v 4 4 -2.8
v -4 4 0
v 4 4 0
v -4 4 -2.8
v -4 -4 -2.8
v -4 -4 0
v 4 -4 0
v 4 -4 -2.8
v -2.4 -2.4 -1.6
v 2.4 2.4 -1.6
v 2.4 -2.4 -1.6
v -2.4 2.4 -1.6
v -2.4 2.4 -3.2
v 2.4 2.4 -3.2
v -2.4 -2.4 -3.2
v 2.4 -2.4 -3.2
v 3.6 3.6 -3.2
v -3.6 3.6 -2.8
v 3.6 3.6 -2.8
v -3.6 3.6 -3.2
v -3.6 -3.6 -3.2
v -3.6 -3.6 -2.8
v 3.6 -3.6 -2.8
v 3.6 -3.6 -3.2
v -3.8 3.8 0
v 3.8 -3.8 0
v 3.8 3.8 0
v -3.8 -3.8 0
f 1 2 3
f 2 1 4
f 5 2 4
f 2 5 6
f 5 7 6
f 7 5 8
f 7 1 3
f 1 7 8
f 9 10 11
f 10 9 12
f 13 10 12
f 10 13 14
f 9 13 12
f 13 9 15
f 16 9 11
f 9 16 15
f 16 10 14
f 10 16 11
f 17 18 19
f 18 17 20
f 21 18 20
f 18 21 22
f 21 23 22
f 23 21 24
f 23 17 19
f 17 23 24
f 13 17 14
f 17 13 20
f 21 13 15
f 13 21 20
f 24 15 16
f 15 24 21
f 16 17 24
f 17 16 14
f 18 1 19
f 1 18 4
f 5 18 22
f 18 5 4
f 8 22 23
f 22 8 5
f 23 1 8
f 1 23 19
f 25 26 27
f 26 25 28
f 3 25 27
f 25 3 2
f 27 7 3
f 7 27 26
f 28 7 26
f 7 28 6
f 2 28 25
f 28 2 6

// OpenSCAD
// file: ../p/box5.scad
use <../lib.scad>
function ldraw_lib__box5() = [
// 0 Box with 5 Faces and All Edges
// 0 Name: box5.dat
// 0 Author: James Jessiman
// 0 !LDRAW_ORG Primitive UPDATE 2012-01
// 0 !LICENSE Licensed under CC BY 4.0 : see CAreadme.txt
// 
// 0 BFC CERTIFY CCW
  [0,"BFC","CERTIFY"],
  [0,"BFC","CCW"],
// 
// 0 !HISTORY 2002-04-03 [sbliss] Modified for BFC compliance
// 0 !HISTORY 2002-04-25 [PTadmin] Official Update 2002-02
// 0 !HISTORY 2007-06-24 [PTadmin] Header formatted for Contributor Agreement
// 0 !HISTORY 2008-07-01 [PTadmin] Official Update 2008-01
// 0 !HISTORY 2012-02-16 [Philo] Changed to CCW
// 0 !HISTORY 2012-03-30 [PTadmin] Official Update 2012-01
// 
// 
// 2 24 1 1 1 -1 1 1
  [2,24,1,1,1,-1,1,1],
// 2 24 -1 1 1 -1 1 -1
  [2,24,-1,1,1,-1,1,-1],
// 2 24 -1 1 -1 1 1 -1
  [2,24,-1,1,-1,1,1,-1],
// 2 24 1 1 -1 1 1 1
  [2,24,1,1,-1,1,1,1],
// 2 24 1 0 1 -1 0 1
  [2,24,1,0,1,-1,0,1],
// 2 24 -1 0 1 -1 0 -1
  [2,24,-1,0,1,-1,0,-1],
// 2 24 -1 0 -1 1 0 -1
  [2,24,-1,0,-1,1,0,-1],
// 2 24 1 0 -1 1 0 1
  [2,24,1,0,-1,1,0,1],
// 2 24 1 0 1 1 1 1
  [2,24,1,0,1,1,1,1],
// 2 24 -1 0 1 -1 1 1
  [2,24,-1,0,1,-1,1,1],
// 2 24 1 0 -1 1 1 -1
  [2,24,1,0,-1,1,1,-1],
// 2 24 -1 0 -1 -1 1 -1
  [2,24,-1,0,-1,-1,1,-1],
// 4 16 -1 1 1 1 1 1 1 1 -1 -1 1 -1
  [4,16,-1,1,1,1,1,1,1,1,-1,-1,1,-1],
// 4 16 -1 1 1 -1 0 1 1 0 1 1 1 1
  [4,16,-1,1,1,-1,0,1,1,0,1,1,1,1],
// 4 16 -1 1 -1 -1 0 -1 -1 0 1 -1 1 1
  [4,16,-1,1,-1,-1,0,-1,-1,0,1,-1,1,1],
// 4 16 1 1 -1 1 0 -1 -1 0 -1 -1 1 -1
  [4,16,1,1,-1,1,0,-1,-1,0,-1,-1,1,-1],
// 4 16 1 1 1 1 0 1 1 0 -1 1 1 -1
  [4,16,1,1,1,1,0,1,1,0,-1,1,1,-1],
];
module ldraw_lib__box5(step=0, col=false, unit=2/5, alt=false, line=0.2, solid=!$preview)
    makepoly(ldraw_lib__box5(), step=step, col=col, unit=unit, alt=alt, line=line, solid=solid);
ldraw_lib__box5(line=0.2);
// file: ../p/box4.scad
use <../lib.scad>
function ldraw_lib__box4() = [
// 0 Box with 4 Faces (2 Parallel Pairs) and All Edges
// 0 Name: box4.dat
// 0 Author: James Jessiman
// 0 !LDRAW_ORG Primitive UPDATE 2012-01
// 0 !LICENSE Licensed under CC BY 4.0 : see CAreadme.txt
// 
// 0 BFC CERTIFY CCW
  [0,"BFC","CERTIFY"],
  [0,"BFC","CCW"],
// 
// 0 !HISTORY 2002-04-03 [sbliss] Modified for BFC compliance
// 0 !HISTORY 2002-04-25 [PTadmin] Official Update 2002-02
// 0 !HISTORY 2007-06-24 [PTadmin] Header formatted for Contributor Agreement
// 0 !HISTORY 2008-07-01 [PTadmin] Official Update 2008-01
// 0 !HISTORY 2012-02-16 [Philo] Changed to CCW
// 0 !HISTORY 2012-03-30 [PTadmin] Official Update 2012-01
// 
// 
// 2 24 1 1 1 -1 1 1
  [2,24,1,1,1,-1,1,1],
// 2 24 -1 1 1 -1 1 -1
  [2,24,-1,1,1,-1,1,-1],
// 2 24 -1 1 -1 1 1 -1
  [2,24,-1,1,-1,1,1,-1],
// 2 24 1 1 -1 1 1 1
  [2,24,1,1,-1,1,1,1],
// 2 24 1 0 1 -1 0 1
  [2,24,1,0,1,-1,0,1],
// 2 24 -1 0 1 -1 0 -1
  [2,24,-1,0,1,-1,0,-1],
// 2 24 -1 0 -1 1 0 -1
  [2,24,-1,0,-1,1,0,-1],
// 2 24 1 0 -1 1 0 1
  [2,24,1,0,-1,1,0,1],
// 2 24 1 0 1 1 1 1
  [2,24,1,0,1,1,1,1],
// 2 24 -1 0 1 -1 1 1
  [2,24,-1,0,1,-1,1,1],
// 2 24 1 0 -1 1 1 -1
  [2,24,1,0,-1,1,1,-1],
// 2 24 -1 0 -1 -1 1 -1
  [2,24,-1,0,-1,-1,1,-1],
// 4 16 -1 1 1 -1 0 1 1 0 1 1 1 1
  [4,16,-1,1,1,-1,0,1,1,0,1,1,1,1],
// 4 16 -1 1 -1 -1 0 -1 -1 0 1 -1 1 1
  [4,16,-1,1,-1,-1,0,-1,-1,0,1,-1,1,1],
// 4 16 1 1 -1 1 0 -1 -1 0 -1 -1 1 -1
  [4,16,1,1,-1,1,0,-1,-1,0,-1,-1,1,-1],
// 4 16 1 1 1 1 0 1 1 0 -1 1 1 -1
  [4,16,1,1,1,1,0,1,1,0,-1,1,1,-1],
];
module ldraw_lib__box4(step=0, col=false, unit=2/5, alt=false, line=0.2, solid=!$preview)
    makepoly(ldraw_lib__box4(), step=step, col=col, unit=unit, alt=alt, line=line, solid=solid);
ldraw_lib__box4(line=0.2);
// file: s/3070bs01.scad
use <../../lib.scad>
use <../../p/box4.scad>
use <../../p/box5.scad>
function ldraw_lib__s__3070bs01() = [
// 0 ~Tile  1 x  1 with Groove without Top Face
// 0 Name: s\3070bs01.dat
// 0 Author: Chris Dee [cwdee]
// 0 !LDRAW_ORG Subpart UPDATE 2009-02
// 0 !LICENSE Licensed under CC BY 4.0 : see CAreadme.txt
// 
// 0 BFC CERTIFY CCW
  [0,"BFC","CERTIFY"],
  [0,"BFC","CCW"],
// 
// 0 !HISTORY 2009-09-03 [PTadmin] Official Update 2009-02
// 
// 
// 1 16 0 0 0 10 0 0 0 7 0 0 0 10 box4.dat
  [1,16,0,0,0,10,0,0,0,7,0,0,0,10, ldraw_lib__box4()],
// 0 BFC INVERTNEXT
  [0,"BFC","INVERTNEXT"],
// 1 16 0 8 0 6 0 0 0 -4 0 0 0 6 box5.dat
  [1,16,0,8,0,6,0,0,0,-4,0,0,0,6, ldraw_lib__box5()],
// 1 16 0 7 0 9 0 0 0 1 0 0 0 9 box4.dat
  [1,16,0,7,0,9,0,0,0,1,0,0,0,9, ldraw_lib__box4()],
// 
// 4 16 9 8 9 6 8 6 -6 8 6 -9 8 9
  [4,16,9,8,9,6,8,6,-6,8,6,-9,8,9],
// 4 16 -9 8 9 -6 8 6 -6 8 -6 -9 8 -9
  [4,16,-9,8,9,-6,8,6,-6,8,-6,-9,8,-9],
// 4 16 -9 8 -9 -6 8 -6 6 8 -6 9 8 -9
  [4,16,-9,8,-9,-6,8,-6,6,8,-6,9,8,-9],
// 4 16 9 8 -9 6 8 -6 6 8 6 9 8 9
  [4,16,9,8,-9,6,8,-6,6,8,6,9,8,9],
// 
// 4 16 10 7 10 9 7 9 -9 7 9 -10 7 10
  [4,16,10,7,10,9,7,9,-9,7,9,-10,7,10],
// 4 16 -10 7 10 -9 7 9 -9 7 -9 -10 7 -10
  [4,16,-10,7,10,-9,7,9,-9,7,-9,-10,7,-10],
// 4 16 -10 7 -10 -9 7 -9 9 7 -9 10 7 -10
  [4,16,-10,7,-10,-9,7,-9,9,7,-9,10,7,-10],
// 4 16 10 7 -10 9 7 -9 9 7 9 10 7 10
  [4,16,10,7,-10,9,7,-9,9,7,9,10,7,10],
// 0
];
module ldraw_lib__s__3070bs01(step=0, col=false, unit=2/5, alt=false, line=0.2, solid=!$preview)
    makepoly(ldraw_lib__s__3070bs01(), step=step, col=col, unit=unit, alt=alt, line=line, solid=solid);
ldraw_lib__s__3070bs01(line=0.2);
// main file
use <../lib.scad>
use <s/3070bs01.scad>
function ldraw_lib__3070bpz6() = [
// 0 Tile  1 x  1 with Metallic Gold Square Pattern
// 0 Name: 3070bpz6.dat
// 0 Author: Peter Grass [Evilspyre]
// 0 !LDRAW_ORG Part UPDATE 2026-03
// 0 !LICENSE Licensed under CC BY 4.0 : see CAreadme.txt
// 
// 0 BFC CERTIFY CCW
  [0,"BFC","CERTIFY"],
  [0,"BFC","CCW"],
// 
// 0 !KEYWORDS Bricklink 3070pb398, Brickowl 1335212, Brickset 114904, Ford Model T
// 0 !KEYWORDS Icons, Rebrickable 3070bpr0051, Set 11376
// 
// 0 !HISTORY 2026-03-31 [OrionP] Official Update 2026-03
// 
// 1 16 0 0 0 1 0 0 0 1 0 0 0 1 s\3070bs01.dat
  [1,16,0,0,0,1,0,0,0,1,0,0,0,1, ldraw_lib__s__3070bs01()],
// 4 82 -9.5 0 9.5 -9.5 0 -9.5 9.5 0 -9.5 9.5 0 9.5
  [4,82,-9.5,0,9.5,-9.5,0,-9.5,9.5,0,-9.5,9.5,0,9.5],
// 4 16 -10 0 10 -9.5 0 9.5 9.5 0 9.5 10 0 10
  [4,16,-10,0,10,-9.5,0,9.5,9.5,0,9.5,10,0,10],
// 4 16 10 0 10 9.5 0 9.5 9.5 0 -9.5 10 0 -10
  [4,16,10,0,10,9.5,0,9.5,9.5,0,-9.5,10,0,-10],
// 4 16 10 0 -10 9.5 0 -9.5 -9.5 0 -9.5 -10 0 -10
  [4,16,10,0,-10,9.5,0,-9.5,-9.5,0,-9.5,-10,0,-10],
// 4 16 -10 0 -10 -9.5 0 -9.5 -9.5 0 9.5 -10 0 10
  [4,16,-10,0,-10,-9.5,0,-9.5,-9.5,0,9.5,-10,0,10],
];
module ldraw_lib__3070bpz6(step=0, col=false, unit=2/5, alt=false, line=0.2, solid=!$preview)
    makepoly(ldraw_lib__3070bpz6(), step=step, col=col, unit=unit, alt=alt, line=line, solid=solid);
ldraw_lib__3070bpz6(line=0.2);
